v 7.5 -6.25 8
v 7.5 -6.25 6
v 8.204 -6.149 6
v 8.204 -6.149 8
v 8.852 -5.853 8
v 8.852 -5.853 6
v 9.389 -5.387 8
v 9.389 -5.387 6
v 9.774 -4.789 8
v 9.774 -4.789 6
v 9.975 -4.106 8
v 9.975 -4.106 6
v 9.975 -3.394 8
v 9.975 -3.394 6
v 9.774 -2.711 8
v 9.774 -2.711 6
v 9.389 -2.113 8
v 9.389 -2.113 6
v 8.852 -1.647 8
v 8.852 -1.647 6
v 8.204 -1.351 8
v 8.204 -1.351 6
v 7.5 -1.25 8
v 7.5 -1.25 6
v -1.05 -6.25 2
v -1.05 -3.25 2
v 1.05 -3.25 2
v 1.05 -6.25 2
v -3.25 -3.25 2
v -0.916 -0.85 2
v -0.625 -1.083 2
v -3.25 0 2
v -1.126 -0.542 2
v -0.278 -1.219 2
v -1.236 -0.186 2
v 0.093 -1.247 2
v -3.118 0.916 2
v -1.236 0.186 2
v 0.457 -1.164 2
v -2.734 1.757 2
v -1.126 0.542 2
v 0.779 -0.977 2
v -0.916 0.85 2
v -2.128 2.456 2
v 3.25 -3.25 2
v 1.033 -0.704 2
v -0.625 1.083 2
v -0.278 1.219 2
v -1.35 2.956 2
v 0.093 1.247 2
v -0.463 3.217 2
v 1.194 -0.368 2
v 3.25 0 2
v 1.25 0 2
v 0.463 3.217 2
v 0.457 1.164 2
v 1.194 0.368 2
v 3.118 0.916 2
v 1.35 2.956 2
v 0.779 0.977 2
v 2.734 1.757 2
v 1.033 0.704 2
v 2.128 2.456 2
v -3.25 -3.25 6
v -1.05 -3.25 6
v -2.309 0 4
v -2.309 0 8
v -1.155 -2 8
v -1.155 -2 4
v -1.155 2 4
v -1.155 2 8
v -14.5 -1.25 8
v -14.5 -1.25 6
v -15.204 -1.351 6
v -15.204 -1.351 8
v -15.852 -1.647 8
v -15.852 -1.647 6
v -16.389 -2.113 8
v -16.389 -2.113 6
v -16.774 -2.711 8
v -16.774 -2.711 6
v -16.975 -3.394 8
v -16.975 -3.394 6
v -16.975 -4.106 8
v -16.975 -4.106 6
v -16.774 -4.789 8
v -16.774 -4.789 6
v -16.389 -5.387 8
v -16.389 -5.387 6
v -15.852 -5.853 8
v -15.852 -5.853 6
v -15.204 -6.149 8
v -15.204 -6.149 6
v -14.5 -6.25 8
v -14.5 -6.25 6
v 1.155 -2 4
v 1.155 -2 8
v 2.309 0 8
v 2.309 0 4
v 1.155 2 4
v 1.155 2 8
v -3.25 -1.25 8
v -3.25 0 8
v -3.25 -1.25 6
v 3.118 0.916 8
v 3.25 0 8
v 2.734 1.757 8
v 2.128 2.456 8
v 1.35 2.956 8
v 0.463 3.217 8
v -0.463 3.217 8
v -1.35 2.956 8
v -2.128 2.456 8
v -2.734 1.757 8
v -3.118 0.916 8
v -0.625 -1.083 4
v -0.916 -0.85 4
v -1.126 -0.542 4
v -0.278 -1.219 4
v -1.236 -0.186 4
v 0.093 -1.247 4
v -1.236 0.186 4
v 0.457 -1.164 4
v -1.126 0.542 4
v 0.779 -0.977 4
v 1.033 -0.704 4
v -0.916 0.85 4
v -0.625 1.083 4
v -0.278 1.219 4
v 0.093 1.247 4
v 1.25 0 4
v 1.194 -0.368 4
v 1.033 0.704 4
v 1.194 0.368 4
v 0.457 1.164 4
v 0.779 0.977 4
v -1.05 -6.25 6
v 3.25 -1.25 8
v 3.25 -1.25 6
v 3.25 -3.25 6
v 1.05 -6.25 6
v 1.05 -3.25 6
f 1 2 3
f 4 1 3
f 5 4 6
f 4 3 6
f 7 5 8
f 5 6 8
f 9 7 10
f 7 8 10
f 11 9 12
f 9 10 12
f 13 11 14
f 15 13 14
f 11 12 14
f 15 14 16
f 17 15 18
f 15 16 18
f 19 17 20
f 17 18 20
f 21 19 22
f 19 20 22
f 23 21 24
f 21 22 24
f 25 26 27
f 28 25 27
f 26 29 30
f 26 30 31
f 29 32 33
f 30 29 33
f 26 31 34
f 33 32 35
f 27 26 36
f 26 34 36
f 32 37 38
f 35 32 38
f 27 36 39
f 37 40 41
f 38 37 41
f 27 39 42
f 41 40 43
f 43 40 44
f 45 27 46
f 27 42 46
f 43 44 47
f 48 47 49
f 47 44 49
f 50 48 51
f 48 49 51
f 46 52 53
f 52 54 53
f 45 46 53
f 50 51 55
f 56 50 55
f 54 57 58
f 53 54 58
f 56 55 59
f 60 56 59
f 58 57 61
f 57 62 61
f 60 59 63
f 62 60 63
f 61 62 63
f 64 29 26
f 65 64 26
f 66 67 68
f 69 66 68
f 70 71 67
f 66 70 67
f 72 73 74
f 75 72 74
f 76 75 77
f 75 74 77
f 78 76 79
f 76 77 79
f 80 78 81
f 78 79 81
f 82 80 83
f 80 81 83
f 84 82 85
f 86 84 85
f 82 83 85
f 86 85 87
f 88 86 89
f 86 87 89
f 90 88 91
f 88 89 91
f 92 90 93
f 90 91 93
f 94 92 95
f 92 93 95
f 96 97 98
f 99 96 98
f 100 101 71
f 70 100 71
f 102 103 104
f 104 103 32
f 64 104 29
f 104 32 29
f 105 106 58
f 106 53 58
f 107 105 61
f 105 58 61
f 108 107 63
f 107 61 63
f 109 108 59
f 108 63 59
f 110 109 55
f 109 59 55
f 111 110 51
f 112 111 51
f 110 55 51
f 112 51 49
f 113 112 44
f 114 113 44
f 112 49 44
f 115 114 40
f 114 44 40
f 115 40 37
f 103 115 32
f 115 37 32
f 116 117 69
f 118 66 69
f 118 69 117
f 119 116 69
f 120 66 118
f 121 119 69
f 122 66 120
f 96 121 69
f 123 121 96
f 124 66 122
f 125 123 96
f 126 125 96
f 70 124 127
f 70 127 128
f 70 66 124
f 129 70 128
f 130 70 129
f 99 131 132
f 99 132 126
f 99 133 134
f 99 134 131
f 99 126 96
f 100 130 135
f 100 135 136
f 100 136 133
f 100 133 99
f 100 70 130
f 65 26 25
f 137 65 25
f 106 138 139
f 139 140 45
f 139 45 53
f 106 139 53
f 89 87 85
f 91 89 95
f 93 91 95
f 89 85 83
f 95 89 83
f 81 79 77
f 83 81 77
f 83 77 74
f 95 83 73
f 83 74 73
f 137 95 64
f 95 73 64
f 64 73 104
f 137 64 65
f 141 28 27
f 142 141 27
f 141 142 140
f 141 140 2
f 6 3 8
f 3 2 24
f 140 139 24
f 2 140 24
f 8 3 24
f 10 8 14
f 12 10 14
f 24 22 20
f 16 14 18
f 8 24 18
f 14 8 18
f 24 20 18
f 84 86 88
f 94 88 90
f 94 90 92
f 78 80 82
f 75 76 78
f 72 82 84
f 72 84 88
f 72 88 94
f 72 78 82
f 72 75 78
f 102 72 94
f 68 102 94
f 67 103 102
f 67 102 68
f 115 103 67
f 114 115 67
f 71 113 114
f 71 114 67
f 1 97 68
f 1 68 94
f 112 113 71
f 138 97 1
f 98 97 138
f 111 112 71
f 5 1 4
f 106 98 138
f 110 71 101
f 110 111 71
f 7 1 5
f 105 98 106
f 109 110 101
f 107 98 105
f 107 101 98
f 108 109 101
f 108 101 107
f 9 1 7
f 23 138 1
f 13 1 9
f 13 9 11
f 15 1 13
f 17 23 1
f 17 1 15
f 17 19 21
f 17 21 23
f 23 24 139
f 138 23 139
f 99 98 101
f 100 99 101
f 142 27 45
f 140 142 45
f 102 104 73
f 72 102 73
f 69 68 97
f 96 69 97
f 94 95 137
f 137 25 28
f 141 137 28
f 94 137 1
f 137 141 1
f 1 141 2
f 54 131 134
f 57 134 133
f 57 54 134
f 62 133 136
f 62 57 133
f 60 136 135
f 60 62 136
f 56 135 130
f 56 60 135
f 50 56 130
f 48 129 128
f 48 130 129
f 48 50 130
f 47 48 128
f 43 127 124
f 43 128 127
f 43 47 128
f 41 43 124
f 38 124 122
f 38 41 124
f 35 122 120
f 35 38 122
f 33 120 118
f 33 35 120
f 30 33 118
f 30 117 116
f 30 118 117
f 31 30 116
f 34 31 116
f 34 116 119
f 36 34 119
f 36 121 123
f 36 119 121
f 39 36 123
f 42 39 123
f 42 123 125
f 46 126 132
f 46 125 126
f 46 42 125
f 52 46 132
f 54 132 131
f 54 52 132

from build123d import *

# Parameters (mm, degrees)
SKETCH1_R           = 1.25
BOSS_EXTRUDE1_DEPTH = 2
SKETCH2_W           = 6
SKETCH2_H           = 2.8
BOSS_EXTRUDE2_DEPTH = 4
SKETCH3_R           = 1.25
BOSS_EXTRUDE3_DEPTH = 4
BOSS_EXTRUDE4_DEPTH = 2
CUT_EXTRUDE1_DEPTH  = 4


with BuildPart() as part:
    # Sketch1 → Boss-Extrude1 (new body)
    with BuildSketch(Plane.XY):
        with BuildLine():
            Line((-14.5, -1.25), (-3.25, -1.25))
            Line((-3.25, -1.25), (-3.25, 0))
            ThreePointArc((-3.25, 0), (0, 3.25), (3.25, 0))
            Line((3.25, 0), (3.25, -1.25))
            Line((3.25, -1.25), (7.5, -1.25))
            ThreePointArc((7.5, -1.25), (10, -3.75), (7.5, -6.25))
            Line((7.5, -6.25), (-14.5, -6.25))
            ThreePointArc((-14.5, -6.25), (-17, -3.75), (-14.5, -1.25))
        make_face()
        Circle(SKETCH1_R, mode=Mode.SUBTRACT)
    extrude(amount=BOSS_EXTRUDE1_DEPTH)

    # Sketch2 → Boss-Extrude2 (add)
    with BuildSketch(Plane.XY.offset(2)):
        with BuildLine():
            Line((-15, -6.199489743), (-15, -1.300510257))
            ThreePointArc((-15, -1.300510257), (-17, -3.75), (-15, -6.199489743))
        make_face()
        with Locations((0, -4.85)):
            Rectangle(SKETCH2_W, SKETCH2_H)
        with BuildLine():
            Line((8, -1.300510257), (8, -6.199489743))
            ThreePointArc((8, -6.199489743), (10, -3.75), (8, -1.300510257))
        make_face()
    extrude(amount=BOSS_EXTRUDE2_DEPTH)


with BuildPart() as body_2:
    # Sketch3 → Boss-Extrude3 (new body)
    with BuildSketch(Plane.XY.offset(2)):
        with BuildLine():
            Line((-3.25, 0), (-3.25, -3.25))
            Line((-3.25, -3.25), (-1.05, -3.25))
            Line((-1.05, -3.25), (-1.05, -6.25))
            Line((-1.05, -6.25), (1.05, -6.25))
            Line((1.05, -6.25), (1.05, -3.25))
            Line((1.05, -3.25), (3.25, -3.25))
            Line((3.25, -3.25), (3.25, 0))
            ThreePointArc((3.25, 0), (0, 3.25), (-3.25, 0))
        make_face()
        Circle(SKETCH3_R, mode=Mode.SUBTRACT)
    extrude(amount=BOSS_EXTRUDE3_DEPTH)

    # Sketch4 → Boss-Extrude4 (add)
    with BuildSketch(Plane.XY.offset(6)):
        with BuildLine():
            Line((7.5, -1.25), (3.25, -1.25))
            Line((3.25, -1.25), (3.25, 0))
            ThreePointArc((3.25, 0), (0, 3.25), (-3.25, 0))
            Line((-3.25, 0), (-3.25, -1.25))
            Line((-3.25, -1.25), (-14.5, -1.25))
            ThreePointArc((-14.5, -1.25), (-17, -3.75), (-14.5, -6.25))
            Line((-14.5, -6.25), (7.5, -6.25))
            ThreePointArc((7.5, -6.25), (10, -3.75), (7.5, -1.25))
        make_face()
    extrude(amount=BOSS_EXTRUDE4_DEPTH)

    # Sketch5 → Cut-Extrude1 (cut)
    with BuildSketch(Plane.XY.offset(8)):
        Polygon((1.154700538, 2), (-1.154700538, 2), (-2.309401077, 0), (-1.154700538, -2), (1.154700538, -2), (2.309401077, 0), align=None)
    extrude(amount=-CUT_EXTRUDE1_DEPTH, mode=Mode.SUBTRACT)


solid = body_2.part
